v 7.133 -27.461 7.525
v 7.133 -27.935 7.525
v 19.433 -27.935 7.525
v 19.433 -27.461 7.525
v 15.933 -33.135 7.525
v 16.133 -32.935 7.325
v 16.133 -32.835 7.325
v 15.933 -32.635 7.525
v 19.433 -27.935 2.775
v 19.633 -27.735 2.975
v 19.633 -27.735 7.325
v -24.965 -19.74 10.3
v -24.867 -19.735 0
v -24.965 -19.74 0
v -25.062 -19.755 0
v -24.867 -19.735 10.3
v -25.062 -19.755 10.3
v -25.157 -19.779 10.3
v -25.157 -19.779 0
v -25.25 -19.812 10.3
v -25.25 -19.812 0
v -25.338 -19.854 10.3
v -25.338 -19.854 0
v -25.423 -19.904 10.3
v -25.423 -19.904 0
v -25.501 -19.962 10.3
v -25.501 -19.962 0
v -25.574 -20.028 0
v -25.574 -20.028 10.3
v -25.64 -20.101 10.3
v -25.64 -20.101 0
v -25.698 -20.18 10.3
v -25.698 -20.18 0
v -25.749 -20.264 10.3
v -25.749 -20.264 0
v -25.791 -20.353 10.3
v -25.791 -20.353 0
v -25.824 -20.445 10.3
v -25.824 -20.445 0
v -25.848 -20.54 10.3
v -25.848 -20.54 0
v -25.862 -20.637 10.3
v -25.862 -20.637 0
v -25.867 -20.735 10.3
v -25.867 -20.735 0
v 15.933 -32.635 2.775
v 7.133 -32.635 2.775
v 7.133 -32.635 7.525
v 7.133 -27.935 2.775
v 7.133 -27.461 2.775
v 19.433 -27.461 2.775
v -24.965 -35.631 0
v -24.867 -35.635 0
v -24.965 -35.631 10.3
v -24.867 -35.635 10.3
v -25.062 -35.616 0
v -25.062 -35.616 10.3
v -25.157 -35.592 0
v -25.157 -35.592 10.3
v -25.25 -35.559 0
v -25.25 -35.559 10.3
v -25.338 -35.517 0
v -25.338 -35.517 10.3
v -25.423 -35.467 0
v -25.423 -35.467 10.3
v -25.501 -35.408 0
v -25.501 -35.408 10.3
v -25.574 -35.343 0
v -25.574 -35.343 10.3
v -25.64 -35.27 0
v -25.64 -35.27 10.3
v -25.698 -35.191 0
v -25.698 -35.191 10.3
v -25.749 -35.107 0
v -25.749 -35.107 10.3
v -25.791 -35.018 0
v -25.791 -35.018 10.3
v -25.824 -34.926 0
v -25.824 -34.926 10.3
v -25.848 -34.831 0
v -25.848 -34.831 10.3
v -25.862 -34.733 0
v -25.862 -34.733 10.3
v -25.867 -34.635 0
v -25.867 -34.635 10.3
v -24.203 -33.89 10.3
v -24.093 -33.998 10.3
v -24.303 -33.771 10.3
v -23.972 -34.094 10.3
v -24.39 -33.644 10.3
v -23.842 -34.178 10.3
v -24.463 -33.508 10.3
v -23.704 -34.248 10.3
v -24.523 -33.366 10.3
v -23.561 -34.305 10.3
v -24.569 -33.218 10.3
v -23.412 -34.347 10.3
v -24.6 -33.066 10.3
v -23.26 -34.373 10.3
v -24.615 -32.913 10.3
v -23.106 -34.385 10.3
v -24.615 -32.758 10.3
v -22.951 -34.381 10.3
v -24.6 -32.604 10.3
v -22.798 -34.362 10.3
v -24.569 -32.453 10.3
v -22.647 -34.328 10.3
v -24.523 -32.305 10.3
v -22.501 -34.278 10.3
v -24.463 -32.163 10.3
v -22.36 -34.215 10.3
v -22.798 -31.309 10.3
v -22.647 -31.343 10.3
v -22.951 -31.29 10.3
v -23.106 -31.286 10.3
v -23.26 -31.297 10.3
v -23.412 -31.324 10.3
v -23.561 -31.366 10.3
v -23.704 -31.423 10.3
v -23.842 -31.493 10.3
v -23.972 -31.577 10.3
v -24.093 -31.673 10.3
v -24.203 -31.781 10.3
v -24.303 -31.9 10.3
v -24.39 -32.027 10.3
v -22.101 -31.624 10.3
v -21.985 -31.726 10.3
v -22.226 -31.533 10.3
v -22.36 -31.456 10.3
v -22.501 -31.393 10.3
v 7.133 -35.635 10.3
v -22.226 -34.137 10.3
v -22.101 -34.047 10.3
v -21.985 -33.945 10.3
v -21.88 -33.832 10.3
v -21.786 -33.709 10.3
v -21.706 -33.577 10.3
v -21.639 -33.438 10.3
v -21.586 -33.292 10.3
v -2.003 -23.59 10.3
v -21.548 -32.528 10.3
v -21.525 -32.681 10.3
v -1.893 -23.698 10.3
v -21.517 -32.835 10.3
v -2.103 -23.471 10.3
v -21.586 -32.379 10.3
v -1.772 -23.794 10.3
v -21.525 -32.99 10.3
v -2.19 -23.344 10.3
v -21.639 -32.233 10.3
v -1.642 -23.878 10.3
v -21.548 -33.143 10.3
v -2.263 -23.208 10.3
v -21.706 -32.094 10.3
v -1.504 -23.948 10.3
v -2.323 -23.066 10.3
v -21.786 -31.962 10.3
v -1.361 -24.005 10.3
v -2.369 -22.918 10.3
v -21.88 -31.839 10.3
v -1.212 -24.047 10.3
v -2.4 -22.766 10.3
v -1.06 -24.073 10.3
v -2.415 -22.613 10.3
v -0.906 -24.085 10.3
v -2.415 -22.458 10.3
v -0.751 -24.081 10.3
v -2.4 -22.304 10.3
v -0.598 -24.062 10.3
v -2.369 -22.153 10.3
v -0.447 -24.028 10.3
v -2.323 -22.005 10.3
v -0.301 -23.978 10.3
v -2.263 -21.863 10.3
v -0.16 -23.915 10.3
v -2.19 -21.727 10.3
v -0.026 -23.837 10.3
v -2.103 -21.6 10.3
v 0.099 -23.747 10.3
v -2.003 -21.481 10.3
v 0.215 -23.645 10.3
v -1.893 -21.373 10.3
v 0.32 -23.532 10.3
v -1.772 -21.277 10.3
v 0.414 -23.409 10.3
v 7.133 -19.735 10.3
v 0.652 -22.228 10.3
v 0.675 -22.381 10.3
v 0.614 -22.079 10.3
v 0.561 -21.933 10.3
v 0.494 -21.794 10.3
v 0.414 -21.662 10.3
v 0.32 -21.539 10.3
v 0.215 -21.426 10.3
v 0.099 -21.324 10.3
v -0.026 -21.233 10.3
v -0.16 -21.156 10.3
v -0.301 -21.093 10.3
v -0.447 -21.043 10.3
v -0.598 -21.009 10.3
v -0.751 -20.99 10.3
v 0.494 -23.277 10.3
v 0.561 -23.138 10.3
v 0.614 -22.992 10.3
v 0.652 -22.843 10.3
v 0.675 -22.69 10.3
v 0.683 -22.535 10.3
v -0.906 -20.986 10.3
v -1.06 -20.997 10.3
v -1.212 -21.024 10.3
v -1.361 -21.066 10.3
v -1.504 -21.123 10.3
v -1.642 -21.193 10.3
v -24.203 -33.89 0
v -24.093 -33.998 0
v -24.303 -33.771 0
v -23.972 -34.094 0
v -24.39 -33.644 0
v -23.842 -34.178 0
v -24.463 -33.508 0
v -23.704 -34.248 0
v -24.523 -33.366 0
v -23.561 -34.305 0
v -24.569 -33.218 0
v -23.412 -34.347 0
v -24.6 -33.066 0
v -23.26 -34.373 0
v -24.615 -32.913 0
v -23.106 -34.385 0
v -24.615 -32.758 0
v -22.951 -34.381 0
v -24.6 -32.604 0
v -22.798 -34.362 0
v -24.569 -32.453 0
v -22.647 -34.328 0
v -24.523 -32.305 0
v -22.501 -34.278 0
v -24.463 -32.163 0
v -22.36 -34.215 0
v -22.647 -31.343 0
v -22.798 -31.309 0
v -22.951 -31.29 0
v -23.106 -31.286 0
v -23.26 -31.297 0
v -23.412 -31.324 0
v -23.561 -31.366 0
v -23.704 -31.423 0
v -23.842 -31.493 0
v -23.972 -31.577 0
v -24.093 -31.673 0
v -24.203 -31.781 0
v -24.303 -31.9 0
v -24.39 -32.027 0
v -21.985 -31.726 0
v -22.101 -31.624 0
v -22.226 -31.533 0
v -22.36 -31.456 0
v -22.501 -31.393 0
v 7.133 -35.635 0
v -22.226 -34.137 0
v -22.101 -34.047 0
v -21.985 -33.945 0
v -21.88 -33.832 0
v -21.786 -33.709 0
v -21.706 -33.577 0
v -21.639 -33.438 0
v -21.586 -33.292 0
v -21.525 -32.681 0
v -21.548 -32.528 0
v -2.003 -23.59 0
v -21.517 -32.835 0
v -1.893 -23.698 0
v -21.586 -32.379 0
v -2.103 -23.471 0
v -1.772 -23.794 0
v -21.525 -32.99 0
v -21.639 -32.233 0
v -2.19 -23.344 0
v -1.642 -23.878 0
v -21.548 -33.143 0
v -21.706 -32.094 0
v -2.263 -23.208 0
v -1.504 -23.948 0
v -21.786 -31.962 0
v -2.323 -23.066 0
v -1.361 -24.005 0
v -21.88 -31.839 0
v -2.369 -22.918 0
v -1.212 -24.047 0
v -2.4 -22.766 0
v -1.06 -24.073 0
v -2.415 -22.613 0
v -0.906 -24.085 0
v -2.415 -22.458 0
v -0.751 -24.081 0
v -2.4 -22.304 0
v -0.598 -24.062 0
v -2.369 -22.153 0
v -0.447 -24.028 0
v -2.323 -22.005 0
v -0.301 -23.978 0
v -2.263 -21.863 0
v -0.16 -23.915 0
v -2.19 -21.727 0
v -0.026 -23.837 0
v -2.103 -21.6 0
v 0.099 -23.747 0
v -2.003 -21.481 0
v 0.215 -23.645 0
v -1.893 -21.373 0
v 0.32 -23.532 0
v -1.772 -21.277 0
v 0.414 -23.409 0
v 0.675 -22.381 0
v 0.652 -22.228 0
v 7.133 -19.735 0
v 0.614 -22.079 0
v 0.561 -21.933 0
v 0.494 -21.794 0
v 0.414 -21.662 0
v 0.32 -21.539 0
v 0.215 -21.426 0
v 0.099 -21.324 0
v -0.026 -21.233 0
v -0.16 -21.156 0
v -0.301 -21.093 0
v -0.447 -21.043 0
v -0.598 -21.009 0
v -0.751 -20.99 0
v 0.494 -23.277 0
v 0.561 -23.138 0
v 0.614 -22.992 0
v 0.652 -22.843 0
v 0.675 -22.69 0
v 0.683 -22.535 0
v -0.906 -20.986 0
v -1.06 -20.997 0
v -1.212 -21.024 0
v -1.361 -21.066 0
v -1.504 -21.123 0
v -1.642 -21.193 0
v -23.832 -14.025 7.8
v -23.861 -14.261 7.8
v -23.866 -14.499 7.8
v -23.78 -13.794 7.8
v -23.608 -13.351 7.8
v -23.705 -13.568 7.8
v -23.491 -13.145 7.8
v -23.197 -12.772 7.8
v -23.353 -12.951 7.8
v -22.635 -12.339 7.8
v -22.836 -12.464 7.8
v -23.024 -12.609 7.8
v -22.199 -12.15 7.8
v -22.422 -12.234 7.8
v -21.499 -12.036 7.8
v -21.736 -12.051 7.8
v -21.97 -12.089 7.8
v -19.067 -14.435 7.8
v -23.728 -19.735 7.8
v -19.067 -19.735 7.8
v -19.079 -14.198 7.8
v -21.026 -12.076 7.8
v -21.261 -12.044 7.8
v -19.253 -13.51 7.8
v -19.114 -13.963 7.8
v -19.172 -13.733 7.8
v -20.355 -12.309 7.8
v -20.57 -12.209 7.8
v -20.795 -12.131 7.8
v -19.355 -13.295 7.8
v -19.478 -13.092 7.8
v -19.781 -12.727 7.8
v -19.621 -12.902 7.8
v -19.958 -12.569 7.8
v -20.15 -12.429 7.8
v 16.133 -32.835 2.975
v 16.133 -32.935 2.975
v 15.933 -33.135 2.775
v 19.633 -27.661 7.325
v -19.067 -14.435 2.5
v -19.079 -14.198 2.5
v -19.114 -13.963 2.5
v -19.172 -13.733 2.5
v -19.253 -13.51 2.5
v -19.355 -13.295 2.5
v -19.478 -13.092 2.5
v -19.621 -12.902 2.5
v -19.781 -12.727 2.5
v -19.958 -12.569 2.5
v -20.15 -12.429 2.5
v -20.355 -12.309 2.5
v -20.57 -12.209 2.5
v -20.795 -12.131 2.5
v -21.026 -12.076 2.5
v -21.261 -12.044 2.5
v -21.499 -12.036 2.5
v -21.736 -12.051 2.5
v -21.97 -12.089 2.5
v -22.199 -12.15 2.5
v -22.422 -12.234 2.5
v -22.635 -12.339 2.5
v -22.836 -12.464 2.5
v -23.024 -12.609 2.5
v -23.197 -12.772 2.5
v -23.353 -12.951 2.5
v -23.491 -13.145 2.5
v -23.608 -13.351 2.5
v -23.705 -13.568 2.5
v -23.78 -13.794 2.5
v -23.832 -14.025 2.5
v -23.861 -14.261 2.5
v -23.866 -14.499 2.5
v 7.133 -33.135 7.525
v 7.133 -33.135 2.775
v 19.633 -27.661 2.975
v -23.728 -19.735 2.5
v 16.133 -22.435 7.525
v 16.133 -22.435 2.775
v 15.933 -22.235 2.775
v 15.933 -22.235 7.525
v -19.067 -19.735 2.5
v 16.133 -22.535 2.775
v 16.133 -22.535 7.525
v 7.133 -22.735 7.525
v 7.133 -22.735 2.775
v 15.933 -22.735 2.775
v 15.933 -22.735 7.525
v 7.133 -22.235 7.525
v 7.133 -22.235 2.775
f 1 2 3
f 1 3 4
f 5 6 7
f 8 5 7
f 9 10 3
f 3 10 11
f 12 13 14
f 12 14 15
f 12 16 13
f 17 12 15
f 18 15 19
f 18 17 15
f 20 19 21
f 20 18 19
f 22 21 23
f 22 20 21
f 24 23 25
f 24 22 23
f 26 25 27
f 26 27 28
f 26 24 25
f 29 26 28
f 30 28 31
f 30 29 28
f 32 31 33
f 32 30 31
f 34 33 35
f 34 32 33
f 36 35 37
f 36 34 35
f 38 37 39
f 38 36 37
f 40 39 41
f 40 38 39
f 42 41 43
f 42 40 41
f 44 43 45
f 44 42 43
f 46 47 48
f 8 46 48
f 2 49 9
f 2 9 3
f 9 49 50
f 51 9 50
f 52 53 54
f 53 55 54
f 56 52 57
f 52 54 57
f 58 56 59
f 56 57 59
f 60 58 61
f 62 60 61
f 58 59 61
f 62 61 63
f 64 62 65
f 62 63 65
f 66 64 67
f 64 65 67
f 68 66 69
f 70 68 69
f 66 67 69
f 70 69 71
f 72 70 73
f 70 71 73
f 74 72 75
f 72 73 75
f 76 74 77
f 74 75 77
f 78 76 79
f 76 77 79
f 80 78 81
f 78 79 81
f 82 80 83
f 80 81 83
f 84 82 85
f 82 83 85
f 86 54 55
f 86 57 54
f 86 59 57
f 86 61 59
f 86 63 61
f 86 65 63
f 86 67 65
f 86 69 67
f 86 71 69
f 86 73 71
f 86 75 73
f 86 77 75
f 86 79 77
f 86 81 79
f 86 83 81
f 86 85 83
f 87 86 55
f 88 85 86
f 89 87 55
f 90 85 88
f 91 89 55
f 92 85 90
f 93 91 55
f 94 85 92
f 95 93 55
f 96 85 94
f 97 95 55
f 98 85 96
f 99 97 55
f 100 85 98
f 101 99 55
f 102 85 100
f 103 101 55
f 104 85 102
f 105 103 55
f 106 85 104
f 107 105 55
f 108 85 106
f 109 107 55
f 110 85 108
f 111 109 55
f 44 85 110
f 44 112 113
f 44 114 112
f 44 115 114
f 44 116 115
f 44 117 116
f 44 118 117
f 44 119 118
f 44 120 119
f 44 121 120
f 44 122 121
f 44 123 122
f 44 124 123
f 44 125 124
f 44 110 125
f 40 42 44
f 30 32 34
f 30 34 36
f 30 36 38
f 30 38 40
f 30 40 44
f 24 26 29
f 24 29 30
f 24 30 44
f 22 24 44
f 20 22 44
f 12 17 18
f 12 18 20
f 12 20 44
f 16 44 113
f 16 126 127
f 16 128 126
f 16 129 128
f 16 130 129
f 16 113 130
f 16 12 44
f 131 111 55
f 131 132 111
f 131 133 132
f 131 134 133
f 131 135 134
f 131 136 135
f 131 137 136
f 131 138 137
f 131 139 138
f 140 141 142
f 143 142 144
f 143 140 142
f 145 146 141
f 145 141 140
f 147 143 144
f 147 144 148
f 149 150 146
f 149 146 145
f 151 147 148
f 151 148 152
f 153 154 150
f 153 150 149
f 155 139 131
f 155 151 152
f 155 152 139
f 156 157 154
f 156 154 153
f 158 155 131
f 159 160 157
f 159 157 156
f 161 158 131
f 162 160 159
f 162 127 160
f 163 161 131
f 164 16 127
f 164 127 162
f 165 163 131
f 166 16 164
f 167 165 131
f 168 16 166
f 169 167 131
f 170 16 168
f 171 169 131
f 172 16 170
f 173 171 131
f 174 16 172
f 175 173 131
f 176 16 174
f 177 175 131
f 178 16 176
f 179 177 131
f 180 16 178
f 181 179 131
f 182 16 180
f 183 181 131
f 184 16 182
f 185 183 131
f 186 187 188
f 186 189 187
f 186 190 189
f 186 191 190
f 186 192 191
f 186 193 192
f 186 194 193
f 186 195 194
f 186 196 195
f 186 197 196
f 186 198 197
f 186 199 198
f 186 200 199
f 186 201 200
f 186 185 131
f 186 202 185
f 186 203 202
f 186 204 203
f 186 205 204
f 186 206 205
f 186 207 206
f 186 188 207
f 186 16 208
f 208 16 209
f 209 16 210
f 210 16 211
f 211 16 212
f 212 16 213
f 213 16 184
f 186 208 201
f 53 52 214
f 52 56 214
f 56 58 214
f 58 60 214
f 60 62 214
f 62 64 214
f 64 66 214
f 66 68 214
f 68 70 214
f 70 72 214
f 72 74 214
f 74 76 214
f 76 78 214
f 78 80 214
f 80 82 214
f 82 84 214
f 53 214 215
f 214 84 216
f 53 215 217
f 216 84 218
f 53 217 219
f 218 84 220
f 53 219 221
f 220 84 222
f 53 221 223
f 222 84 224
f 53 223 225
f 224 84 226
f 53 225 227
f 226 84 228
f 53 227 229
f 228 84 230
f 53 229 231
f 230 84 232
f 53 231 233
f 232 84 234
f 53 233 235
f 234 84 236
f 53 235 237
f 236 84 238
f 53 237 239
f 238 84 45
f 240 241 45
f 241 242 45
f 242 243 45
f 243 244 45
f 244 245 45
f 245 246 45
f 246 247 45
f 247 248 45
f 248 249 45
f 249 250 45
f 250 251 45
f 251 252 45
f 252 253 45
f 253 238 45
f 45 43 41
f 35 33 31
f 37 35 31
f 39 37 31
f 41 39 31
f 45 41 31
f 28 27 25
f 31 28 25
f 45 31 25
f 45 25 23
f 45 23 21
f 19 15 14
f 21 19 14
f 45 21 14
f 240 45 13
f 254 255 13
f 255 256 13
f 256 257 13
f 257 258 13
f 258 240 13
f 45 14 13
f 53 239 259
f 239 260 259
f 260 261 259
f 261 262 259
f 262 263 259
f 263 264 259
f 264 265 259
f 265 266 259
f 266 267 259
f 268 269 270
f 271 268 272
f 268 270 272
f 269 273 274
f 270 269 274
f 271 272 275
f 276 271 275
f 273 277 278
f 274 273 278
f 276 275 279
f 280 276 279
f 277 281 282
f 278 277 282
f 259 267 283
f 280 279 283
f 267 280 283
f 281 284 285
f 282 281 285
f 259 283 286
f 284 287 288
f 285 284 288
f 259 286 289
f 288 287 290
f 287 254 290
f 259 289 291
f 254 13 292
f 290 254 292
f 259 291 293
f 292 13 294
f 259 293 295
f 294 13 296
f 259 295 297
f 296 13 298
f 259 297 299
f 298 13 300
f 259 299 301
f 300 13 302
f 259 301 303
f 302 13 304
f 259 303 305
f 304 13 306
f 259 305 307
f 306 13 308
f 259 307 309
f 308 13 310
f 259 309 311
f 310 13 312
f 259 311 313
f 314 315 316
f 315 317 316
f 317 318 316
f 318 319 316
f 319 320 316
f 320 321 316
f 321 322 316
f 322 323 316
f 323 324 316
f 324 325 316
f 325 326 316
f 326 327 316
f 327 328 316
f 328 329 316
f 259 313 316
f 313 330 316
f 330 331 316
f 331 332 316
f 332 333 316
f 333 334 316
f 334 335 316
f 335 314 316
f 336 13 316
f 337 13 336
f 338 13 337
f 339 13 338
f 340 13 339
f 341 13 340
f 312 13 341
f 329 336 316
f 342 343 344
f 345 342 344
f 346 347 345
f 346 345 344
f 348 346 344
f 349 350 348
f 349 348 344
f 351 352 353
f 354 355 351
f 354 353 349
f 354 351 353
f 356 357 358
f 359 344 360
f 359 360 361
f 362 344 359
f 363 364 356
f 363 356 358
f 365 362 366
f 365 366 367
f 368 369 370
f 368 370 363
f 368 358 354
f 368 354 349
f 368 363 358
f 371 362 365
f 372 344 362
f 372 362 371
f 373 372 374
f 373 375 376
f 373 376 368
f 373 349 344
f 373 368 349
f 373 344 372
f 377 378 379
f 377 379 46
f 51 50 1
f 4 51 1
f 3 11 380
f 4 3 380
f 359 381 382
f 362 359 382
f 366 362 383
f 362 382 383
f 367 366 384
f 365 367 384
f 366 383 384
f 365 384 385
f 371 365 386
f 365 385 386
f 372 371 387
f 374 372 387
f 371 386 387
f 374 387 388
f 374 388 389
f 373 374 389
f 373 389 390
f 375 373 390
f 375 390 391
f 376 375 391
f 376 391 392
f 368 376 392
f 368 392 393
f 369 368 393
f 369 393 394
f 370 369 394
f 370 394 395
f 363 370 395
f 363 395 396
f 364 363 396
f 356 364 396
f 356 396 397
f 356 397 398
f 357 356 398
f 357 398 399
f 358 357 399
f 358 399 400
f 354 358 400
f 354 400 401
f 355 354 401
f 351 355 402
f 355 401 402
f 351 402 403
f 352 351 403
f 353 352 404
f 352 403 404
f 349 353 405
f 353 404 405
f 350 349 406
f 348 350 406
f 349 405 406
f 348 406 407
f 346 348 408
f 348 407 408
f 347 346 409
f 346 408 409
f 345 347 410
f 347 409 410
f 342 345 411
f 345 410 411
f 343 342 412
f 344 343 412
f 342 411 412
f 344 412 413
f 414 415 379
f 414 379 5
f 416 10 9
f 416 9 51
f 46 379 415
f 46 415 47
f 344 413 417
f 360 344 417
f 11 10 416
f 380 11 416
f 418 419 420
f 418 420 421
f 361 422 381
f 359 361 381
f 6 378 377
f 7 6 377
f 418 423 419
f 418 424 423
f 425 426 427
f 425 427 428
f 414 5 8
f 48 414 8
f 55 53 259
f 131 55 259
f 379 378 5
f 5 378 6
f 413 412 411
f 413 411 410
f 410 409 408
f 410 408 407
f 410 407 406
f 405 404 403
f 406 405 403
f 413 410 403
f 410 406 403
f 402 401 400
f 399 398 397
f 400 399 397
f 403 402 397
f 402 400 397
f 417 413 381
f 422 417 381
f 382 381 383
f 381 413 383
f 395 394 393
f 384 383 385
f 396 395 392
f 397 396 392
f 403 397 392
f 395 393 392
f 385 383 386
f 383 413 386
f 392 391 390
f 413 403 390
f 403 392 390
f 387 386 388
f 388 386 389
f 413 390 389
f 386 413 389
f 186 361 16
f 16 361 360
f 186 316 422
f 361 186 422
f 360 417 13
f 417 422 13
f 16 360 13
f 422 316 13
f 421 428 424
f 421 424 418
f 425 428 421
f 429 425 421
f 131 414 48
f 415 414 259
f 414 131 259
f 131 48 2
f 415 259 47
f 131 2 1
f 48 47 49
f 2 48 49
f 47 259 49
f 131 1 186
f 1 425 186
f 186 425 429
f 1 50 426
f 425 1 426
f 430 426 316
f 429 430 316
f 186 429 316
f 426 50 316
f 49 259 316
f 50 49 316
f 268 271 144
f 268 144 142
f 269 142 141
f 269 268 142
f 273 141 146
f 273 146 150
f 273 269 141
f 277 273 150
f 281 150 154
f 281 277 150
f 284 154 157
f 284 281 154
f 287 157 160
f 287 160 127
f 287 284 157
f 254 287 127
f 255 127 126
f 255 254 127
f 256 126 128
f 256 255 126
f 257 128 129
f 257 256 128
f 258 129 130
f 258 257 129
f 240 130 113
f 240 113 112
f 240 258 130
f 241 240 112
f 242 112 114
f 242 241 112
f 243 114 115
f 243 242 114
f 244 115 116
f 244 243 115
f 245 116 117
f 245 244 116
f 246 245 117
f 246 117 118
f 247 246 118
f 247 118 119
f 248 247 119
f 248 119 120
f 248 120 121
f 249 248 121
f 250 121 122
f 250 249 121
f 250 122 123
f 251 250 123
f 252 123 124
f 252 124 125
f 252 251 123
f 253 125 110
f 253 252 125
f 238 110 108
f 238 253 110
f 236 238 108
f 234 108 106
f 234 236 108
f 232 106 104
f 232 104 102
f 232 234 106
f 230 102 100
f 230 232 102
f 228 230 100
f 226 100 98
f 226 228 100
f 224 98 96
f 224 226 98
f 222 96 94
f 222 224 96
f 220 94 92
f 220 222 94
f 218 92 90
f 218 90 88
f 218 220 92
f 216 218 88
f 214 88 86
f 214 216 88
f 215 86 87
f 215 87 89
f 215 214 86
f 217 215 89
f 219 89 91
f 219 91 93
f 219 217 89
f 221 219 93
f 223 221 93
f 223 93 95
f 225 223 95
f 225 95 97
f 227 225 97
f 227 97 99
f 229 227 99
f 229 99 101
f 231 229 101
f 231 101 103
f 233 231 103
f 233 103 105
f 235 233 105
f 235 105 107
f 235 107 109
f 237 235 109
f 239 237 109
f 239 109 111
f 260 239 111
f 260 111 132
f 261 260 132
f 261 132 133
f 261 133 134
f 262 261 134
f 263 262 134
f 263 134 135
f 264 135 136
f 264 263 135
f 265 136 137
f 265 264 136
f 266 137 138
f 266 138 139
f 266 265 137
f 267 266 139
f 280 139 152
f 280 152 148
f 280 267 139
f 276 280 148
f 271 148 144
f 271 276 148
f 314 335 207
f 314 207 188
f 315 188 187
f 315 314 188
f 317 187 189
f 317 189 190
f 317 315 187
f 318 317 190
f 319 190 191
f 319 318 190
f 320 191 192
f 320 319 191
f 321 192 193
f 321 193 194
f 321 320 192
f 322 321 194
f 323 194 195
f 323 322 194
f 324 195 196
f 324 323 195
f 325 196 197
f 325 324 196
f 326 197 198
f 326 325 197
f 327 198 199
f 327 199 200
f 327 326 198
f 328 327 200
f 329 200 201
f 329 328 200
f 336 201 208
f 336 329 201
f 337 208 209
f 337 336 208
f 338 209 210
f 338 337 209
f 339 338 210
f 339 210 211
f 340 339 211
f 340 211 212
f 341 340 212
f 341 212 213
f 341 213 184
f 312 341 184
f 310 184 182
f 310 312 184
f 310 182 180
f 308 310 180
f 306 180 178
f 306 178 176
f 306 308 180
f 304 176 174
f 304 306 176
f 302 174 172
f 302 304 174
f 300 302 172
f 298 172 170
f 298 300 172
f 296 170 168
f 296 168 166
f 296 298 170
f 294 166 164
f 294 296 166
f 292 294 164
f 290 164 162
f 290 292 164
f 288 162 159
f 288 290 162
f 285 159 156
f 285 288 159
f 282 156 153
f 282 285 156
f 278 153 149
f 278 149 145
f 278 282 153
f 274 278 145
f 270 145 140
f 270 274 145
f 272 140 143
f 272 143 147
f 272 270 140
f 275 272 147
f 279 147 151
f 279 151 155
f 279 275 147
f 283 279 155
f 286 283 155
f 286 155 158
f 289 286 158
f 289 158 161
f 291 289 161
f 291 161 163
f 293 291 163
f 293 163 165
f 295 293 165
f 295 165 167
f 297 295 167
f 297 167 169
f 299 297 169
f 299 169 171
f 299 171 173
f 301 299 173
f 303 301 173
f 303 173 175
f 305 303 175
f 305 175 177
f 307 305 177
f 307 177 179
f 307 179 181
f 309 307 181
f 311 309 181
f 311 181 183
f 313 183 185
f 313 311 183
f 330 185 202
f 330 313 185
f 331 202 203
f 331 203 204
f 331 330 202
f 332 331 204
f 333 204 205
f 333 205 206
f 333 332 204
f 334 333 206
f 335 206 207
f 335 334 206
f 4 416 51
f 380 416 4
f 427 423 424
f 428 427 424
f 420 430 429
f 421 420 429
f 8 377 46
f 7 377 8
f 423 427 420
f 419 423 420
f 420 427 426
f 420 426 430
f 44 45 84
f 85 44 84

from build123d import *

# Parameters (mm, degrees)
F0_R     = 1.55
F1_DEPTH = 10.3
F3_DEPTH = 2.5
F4_DEPTH = 2.5
F5_W     = 0.5
F5_H     = 4.75
F6_DEPTH = 9
F5_W_2   = 0.474308
F7_DEPTH = 12.5
F8_SIZE  = 0.2
F9_R     = 1


with BuildPart() as f1:
    # F0 (on Top) → F1 (new body)
    with BuildSketch(Plane.XY):
        Polygon((-23.728283, -19.735446), (-25.866954, -19.735446), (-25.866954, -35.635446), (7.133046, -35.635446), (7.133046, -19.735446), (-19.066954, -19.735446), align=None)
        with Locations((-23.066954, -32.835446)):
            Circle(F0_R, mode=Mode.SUBTRACT)
        with Locations((-0.866954, -22.535446)):
            Circle(F0_R, mode=Mode.SUBTRACT)
        with BuildLine():
            Line((-23.866123, -14.498595), (-23.728283, -19.735446))
            Line((-23.728283, -19.735446), (-19.066954, -19.735446))
            Line((-19.066954, -19.735446), (-19.066954, -14.435446))
            ThreePointArc((-19.066954, -14.435446), (-21.435376, -16.835239), (-23.866123, -14.498595))
        make_face()
        with BuildLine():
            ThreePointArc((-19.066954, -14.435446), (-21.498531, -12.035654), (-23.866123, -14.498595))
            ThreePointArc((-23.866123, -14.498595), (-21.435376, -16.835239), (-19.066954, -14.435446))
        make_face()
    extrude(amount=F1_DEPTH)

    # F2 (on face) → F3 (cut)
    with BuildSketch(Plane.XY.offset(10.3)):
        with BuildLine():
            Line((-23.866123, -14.498595), (-23.728283, -19.735446))
            Line((-23.728283, -19.735446), (-19.066954, -19.735446))
            Line((-19.066954, -19.735446), (-19.066954, -14.435446))
            ThreePointArc((-19.066954, -14.435446), (-21.498531, -12.035654), (-23.866123, -14.498595))
        make_face()
    extrude(amount=-F3_DEPTH, mode=Mode.SUBTRACT)

    # F0 (on Top) → F4 (cut)
    with BuildSketch(Plane.XY):
        with BuildLine():
            Line((-23.866123, -14.498595), (-23.728283, -19.735446))
            Line((-23.728283, -19.735446), (-19.066954, -19.735446))
            Line((-19.066954, -19.735446), (-19.066954, -14.435446))
            ThreePointArc((-19.066954, -14.435446), (-21.435376, -16.835239), (-23.866123, -14.498595))
        make_face()
        with BuildLine():
            ThreePointArc((-19.066954, -14.435446), (-21.498531, -12.035654), (-23.866123, -14.498595))
            ThreePointArc((-23.866123, -14.498595), (-21.435376, -16.835239), (-19.066954, -14.435446))
        make_face()
    extrude(amount=F4_DEPTH, mode=Mode.SUBTRACT)

    # F5 (on face) → F6 (join)
    with BuildSketch(Plane.YZ.offset(7.133046)):
        with Locations((-22.485446, 5.15)):
            Rectangle(F5_W, F5_H)
        with Locations((-32.885446, 5.15)):
            Rectangle(F5_W, F5_H)
    extrude(amount=F6_DEPTH)

    # F5 (on face) → F7 (join)
    with BuildSketch(Plane.YZ.offset(7.133046)):
        with Locations((-27.698292, 5.15)):
            Rectangle(F5_W_2, F5_H)
    extrude(amount=F7_DEPTH)

    # F8
    f8_edges = [f1.edges().sort_by_distance(p)[0] for p in [
        (16.133046, -22.235446, 5.15),
        (16.133046, -22.735446, 5.15),
        (19.633046, -27.461138, 5.15),
        (19.633046, -27.698292, 7.525),
        (19.633046, -27.935446, 5.15),
        (19.633046, -27.698292, 2.775),
        (16.133046, -32.635446, 5.15),
        (16.133046, -32.885446, 7.525),
        (16.133046, -33.135446, 5.15),
        (16.133046, -32.885446, 2.775),
    ]]
    chamfer(f8_edges, length=F8_SIZE)

    # F9
    f9_edges = [f1.edges().sort_by_distance(p)[0] for p in [
        (-25.866954, -19.735446, 5.15),
        (-25.866954, -35.635446, 5.15),
    ]]
    fillet(f9_edges, radius=F9_R)


solid = f1.part
